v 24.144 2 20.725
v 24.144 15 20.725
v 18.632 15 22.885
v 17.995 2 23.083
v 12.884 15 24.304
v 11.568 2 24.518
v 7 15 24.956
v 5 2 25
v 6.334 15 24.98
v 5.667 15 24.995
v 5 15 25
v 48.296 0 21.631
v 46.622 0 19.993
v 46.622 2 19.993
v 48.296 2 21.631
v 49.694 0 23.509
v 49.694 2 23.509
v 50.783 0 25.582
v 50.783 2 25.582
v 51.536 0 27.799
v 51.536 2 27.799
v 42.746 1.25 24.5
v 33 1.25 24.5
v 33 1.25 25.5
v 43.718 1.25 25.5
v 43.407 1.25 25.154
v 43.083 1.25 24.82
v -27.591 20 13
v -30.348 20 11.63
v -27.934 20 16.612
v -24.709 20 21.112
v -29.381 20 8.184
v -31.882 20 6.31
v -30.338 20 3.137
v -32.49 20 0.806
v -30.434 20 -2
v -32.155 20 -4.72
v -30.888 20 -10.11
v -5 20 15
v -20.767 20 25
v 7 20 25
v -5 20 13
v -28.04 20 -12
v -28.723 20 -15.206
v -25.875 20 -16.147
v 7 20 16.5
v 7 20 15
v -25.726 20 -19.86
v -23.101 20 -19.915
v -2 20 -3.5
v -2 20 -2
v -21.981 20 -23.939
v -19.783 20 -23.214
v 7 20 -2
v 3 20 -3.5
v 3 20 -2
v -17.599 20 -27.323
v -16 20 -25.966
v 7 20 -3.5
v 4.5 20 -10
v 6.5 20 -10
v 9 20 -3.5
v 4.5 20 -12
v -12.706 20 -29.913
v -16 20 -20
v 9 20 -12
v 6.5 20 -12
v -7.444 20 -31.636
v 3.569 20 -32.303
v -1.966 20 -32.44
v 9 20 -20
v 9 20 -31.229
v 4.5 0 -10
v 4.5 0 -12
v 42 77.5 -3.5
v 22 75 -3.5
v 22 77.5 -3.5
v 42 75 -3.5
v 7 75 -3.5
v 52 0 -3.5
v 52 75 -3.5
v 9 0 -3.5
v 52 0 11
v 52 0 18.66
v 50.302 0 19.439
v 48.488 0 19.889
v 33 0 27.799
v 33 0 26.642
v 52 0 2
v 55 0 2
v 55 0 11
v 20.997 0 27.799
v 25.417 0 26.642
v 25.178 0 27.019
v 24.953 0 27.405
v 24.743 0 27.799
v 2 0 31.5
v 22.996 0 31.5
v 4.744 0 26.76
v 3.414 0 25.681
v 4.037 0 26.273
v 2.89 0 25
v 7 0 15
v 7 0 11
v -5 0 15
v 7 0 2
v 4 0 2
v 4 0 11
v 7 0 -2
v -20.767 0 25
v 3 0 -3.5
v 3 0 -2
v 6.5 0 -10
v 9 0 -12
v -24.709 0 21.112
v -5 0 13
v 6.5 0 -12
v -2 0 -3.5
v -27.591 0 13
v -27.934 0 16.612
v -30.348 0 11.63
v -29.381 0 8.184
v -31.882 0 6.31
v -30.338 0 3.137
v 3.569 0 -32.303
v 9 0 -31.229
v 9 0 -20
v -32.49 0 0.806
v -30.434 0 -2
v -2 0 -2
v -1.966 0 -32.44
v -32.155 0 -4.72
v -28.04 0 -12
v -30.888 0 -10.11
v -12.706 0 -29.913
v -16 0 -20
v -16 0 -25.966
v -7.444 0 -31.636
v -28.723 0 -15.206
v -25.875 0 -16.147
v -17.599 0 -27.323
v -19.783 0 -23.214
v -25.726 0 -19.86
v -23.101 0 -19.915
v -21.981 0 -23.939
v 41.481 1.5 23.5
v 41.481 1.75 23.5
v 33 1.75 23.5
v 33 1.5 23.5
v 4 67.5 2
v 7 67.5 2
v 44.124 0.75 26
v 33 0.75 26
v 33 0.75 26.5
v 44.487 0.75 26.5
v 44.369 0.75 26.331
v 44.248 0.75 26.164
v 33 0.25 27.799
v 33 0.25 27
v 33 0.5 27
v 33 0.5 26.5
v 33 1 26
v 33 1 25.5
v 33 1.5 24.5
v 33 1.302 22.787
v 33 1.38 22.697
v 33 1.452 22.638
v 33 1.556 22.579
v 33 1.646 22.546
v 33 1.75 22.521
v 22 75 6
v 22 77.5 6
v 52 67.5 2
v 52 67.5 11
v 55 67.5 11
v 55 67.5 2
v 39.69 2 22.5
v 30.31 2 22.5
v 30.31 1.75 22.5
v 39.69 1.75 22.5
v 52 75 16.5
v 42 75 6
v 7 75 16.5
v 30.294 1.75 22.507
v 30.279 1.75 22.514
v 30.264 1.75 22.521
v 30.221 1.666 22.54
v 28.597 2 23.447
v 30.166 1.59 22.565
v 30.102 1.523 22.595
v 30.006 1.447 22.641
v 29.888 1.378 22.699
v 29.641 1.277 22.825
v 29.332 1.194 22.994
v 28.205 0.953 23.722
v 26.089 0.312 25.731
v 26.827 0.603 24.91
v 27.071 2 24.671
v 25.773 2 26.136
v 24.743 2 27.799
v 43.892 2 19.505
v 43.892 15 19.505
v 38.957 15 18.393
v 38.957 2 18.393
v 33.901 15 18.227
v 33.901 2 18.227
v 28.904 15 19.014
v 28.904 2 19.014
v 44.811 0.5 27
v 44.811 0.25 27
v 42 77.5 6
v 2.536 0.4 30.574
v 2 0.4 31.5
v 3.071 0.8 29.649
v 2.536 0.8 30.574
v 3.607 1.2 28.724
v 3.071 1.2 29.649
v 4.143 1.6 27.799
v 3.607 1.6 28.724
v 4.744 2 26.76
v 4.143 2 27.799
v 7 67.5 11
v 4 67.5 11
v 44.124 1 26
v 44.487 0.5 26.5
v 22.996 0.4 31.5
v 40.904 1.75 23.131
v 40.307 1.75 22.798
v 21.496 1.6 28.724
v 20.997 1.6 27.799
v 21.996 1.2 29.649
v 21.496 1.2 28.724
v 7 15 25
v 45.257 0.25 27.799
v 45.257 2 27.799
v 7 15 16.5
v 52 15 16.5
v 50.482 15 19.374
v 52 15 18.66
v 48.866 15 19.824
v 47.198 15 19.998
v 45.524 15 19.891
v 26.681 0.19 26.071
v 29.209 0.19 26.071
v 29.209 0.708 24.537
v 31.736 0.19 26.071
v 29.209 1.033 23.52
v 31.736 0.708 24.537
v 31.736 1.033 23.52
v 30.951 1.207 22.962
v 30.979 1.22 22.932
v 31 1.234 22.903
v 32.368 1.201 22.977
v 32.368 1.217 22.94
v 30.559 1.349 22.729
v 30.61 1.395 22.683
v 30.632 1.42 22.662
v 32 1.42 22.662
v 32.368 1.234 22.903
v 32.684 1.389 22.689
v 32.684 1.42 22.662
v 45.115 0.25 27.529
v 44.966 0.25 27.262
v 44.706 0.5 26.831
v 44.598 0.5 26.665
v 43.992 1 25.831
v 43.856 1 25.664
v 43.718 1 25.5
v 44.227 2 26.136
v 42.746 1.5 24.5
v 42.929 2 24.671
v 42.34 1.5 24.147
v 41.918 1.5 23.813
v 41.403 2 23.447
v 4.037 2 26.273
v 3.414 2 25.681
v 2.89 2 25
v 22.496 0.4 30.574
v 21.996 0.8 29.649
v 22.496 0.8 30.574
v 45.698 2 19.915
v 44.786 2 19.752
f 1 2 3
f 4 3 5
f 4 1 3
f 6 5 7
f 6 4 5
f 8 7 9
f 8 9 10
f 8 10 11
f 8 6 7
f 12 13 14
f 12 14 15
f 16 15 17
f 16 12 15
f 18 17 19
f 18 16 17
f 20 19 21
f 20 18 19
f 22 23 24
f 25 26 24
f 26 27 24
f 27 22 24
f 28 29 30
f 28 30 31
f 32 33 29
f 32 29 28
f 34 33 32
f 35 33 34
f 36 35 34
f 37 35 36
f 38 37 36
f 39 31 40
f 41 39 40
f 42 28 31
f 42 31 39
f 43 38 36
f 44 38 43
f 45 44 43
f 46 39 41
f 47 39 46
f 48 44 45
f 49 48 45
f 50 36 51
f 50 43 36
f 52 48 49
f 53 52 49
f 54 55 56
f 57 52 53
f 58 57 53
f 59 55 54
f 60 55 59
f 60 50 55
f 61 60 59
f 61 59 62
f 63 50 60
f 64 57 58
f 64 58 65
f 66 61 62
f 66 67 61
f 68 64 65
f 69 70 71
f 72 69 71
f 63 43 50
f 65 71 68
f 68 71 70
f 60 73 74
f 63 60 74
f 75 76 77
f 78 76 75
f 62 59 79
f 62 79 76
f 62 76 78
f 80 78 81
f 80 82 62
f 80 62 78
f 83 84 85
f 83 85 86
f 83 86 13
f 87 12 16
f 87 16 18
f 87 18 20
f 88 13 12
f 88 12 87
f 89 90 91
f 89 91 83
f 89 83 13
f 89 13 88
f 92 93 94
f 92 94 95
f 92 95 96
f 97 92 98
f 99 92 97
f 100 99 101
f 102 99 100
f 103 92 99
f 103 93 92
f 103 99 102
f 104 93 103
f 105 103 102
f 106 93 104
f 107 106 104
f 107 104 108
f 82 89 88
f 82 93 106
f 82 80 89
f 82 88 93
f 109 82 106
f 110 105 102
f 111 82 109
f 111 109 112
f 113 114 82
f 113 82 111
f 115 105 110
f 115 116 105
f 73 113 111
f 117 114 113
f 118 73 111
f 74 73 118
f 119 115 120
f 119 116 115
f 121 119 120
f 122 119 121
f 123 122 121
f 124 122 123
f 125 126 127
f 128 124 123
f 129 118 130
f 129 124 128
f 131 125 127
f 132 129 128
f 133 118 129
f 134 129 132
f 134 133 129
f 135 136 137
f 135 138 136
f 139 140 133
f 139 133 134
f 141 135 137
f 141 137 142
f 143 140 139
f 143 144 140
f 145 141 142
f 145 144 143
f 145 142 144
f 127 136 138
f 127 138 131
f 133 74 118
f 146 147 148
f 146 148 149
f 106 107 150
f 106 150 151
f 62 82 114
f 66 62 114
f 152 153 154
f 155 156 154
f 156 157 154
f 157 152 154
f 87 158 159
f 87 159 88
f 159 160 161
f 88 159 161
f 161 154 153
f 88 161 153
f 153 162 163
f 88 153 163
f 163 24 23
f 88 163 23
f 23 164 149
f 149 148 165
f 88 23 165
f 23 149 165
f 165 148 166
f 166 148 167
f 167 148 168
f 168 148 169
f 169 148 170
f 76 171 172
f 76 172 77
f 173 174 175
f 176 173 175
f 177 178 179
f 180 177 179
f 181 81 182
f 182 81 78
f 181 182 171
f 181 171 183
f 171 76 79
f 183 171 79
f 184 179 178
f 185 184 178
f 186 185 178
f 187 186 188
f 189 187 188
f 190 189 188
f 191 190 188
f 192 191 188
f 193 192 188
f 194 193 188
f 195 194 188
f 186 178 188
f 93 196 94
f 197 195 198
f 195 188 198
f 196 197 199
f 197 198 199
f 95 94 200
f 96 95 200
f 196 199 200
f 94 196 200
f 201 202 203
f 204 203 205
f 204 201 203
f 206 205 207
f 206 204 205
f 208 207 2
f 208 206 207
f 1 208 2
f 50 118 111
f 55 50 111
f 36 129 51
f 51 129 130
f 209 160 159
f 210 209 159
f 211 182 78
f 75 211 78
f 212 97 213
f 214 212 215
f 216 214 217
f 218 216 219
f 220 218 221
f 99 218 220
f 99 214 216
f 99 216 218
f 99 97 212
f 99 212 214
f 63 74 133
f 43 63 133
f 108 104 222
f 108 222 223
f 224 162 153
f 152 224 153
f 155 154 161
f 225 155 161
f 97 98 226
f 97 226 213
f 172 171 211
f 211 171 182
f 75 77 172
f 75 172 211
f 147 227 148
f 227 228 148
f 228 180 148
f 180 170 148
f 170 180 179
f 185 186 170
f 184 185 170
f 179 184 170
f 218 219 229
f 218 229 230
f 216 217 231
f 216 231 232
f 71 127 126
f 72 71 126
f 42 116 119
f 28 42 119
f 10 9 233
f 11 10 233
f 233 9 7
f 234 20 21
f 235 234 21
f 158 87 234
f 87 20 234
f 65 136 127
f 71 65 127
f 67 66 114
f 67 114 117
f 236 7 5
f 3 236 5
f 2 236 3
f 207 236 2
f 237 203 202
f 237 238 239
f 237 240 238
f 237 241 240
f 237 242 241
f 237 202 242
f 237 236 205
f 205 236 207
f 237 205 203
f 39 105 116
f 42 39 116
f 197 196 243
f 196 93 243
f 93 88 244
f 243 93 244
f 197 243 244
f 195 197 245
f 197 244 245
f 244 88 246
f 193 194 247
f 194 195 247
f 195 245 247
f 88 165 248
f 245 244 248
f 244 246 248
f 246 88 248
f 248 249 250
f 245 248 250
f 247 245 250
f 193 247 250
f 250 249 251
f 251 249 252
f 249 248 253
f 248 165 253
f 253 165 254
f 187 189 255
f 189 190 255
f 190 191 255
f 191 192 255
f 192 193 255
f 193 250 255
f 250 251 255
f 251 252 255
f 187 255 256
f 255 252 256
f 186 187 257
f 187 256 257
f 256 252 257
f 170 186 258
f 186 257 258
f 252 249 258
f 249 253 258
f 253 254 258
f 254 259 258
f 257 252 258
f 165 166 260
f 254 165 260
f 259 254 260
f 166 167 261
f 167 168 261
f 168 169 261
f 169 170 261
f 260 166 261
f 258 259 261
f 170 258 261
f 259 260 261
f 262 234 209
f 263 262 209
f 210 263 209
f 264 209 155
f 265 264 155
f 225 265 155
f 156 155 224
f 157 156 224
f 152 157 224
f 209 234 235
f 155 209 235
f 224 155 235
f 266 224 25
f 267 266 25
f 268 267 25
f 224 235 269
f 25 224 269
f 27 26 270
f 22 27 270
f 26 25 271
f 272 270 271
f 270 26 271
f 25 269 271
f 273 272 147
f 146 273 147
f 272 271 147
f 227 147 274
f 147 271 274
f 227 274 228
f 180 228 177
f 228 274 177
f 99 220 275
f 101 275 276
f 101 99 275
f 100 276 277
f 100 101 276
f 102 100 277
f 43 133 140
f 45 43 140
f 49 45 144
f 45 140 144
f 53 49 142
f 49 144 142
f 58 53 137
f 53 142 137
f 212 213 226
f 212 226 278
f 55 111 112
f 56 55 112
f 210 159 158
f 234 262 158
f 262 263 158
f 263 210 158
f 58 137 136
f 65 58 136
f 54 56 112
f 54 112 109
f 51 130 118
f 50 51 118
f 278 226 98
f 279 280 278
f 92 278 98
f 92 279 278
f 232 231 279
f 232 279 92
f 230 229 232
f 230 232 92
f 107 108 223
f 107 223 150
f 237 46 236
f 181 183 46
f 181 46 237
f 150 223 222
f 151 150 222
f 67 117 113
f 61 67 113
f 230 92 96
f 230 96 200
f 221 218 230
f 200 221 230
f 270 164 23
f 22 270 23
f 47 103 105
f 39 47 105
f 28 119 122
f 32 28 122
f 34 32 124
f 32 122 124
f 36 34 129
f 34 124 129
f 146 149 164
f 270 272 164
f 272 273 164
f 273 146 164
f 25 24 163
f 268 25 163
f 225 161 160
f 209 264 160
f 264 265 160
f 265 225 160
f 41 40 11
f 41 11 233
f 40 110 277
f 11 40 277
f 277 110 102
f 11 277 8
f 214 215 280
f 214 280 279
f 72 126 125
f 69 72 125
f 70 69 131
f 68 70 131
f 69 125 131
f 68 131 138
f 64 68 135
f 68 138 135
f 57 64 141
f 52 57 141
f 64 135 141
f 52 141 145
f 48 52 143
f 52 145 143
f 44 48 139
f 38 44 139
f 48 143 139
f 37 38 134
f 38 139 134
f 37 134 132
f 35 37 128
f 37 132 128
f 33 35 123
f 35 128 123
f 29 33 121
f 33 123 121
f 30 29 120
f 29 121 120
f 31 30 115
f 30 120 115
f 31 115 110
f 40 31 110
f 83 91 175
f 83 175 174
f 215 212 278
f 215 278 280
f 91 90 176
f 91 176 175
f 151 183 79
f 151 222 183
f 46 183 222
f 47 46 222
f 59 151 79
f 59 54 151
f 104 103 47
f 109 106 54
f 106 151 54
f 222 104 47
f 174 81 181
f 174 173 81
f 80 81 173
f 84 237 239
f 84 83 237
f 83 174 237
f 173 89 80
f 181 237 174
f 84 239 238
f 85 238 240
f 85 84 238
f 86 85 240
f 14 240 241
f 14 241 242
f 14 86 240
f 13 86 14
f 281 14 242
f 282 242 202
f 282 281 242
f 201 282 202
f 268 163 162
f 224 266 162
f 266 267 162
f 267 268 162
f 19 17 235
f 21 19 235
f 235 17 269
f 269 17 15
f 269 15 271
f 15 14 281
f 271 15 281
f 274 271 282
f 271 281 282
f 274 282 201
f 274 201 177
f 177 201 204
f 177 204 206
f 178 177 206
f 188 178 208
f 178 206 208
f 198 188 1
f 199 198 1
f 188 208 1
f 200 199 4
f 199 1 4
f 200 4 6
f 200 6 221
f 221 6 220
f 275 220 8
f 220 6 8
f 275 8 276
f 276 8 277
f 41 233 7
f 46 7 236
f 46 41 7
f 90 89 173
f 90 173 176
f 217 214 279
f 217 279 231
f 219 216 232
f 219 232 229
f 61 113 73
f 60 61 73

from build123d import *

# Parameters (mm, degrees)
EXTRUDE_1_DEPTH          = 20
EXTRUDE_2_DEPTH          = 75
CUT_EXTRUDE_1_REACH      = 104.675
SKETCH_4_W               = 3
SKETCH_4_H               = 7.5
CUT_EXTRUDE_3_DEPTH      = 15
SKETCH_10_W              = 45
SKETCH_10_H              = 8.5
CUT_EXTRUDE_4_DEPTH      = 5
EXTRUDE_7_DEPTH          = 2
CUT_EXTRUDE_5_REACH      = 99.006
CUT_EXTRUDE_6_DEPTH      = 21
CUT_EXTRUDE_7_REACH      = 99.006
SKETCH_16_R              = 11.5
EXTRUDE_8_DEPTH          = 11
EXTRUDE_8_DEPTH_BACK     = 11
CUT_EXTRUDE_8_REACH      = 106.745
CUT_EXTRUDE_8_END_RADIUS = 11.5
SKETCH_22_W              = 20
SKETCH_22_H              = 9.5
EXTRUDE_9_DEPTH          = 2.5


with BuildPart() as part:
    # 草图1 → 凸台-拉伸1 (new body)
    with BuildSketch(Plane(origin=(0, 0, 0), x_dir=(1, 0, 0), z_dir=(0, 1, 0))):
        with BuildLine():
            Line((-20.766559657, -25), (52, -25))
            Line((52, -25), (52, -15))
            Line((52, -15), (-5, -15))
            Line((-5, -15), (-5, -13))
            Line((-5, -13), (-27.590759323, -13))
            ThreePointArc((-27.590759323, -13), (-29.966289228, -5.680801874), (-30.434355587, 2))
            Line((-30.434355587, 2), (-2, 2))
            Line((-2, 2), (-2, 3.5))
            Line((-2, 3.5), (3, 3.5))
            Line((3, 3.5), (3, 2))
            Line((3, 2), (9, 2))
            Line((9, 2), (9, 12))
            Line((9, 12), (6.5, 12))
            Line((6.5, 12), (6.5, 10))
            Line((6.5, 10), (4.5, 10))
            Line((4.5, 10), (4.5, 12))
            Line((4.5, 12), (-28.040149786, 12))
            ThreePointArc((-28.040149786, 12), (-23.100827955, 19.914862485), (-16, 25.966324345))
            Line((-16, 25.966324345), (-16, 20))
            Line((-16, 20), (9, 20))
            Line((9, 20), (9, 31.228992939))
            ThreePointArc((9, 31.228992939), (-28.723472863, 15.205660351), (-20.766559657, -25))
        make_face()
    extrude(amount=EXTRUDE_1_DEPTH)

    # 草图3 → 凸台-拉伸2 (add)
    with BuildSketch(Plane(origin=(0, 0, 0), x_dir=(1, 0, 0), z_dir=(0, 1, 0))):
        Polygon((7, 3.5), (52, 3.5), (52, -2), (55, -2), (55, -11), (52, -11), (52, -16.5), (7, -16.5), (7, -11), (4, -11), (4, -2), (7, -2), align=None)
    extrude(amount=EXTRUDE_2_DEPTH)

    # 草图4 → 切除-拉伸1 (cut, up to next)
    with BuildSketch(Plane.XY.offset(11), mode=Mode.PRIVATE) as cut_extrude_1_sk1:
        with Locations((5.5, 71.25)):
            Rectangle(SKETCH_4_W, SKETCH_4_H)
    cut_extrude_1_tool1 = extrude(cut_extrude_1_sk1.sketch, amount=-CUT_EXTRUDE_1_REACH, mode=Mode.PRIVATE) & part.part
    # 草图4 → 切除-拉伸1 (cut, up to next)
    with BuildSketch(Plane.XY.offset(11), mode=Mode.PRIVATE) as cut_extrude_1_sk2:
        with Locations((53.5, 71.25)):
            Rectangle(SKETCH_4_W, SKETCH_4_H)
    cut_extrude_1_tool2 = extrude(cut_extrude_1_sk2.sketch, amount=-CUT_EXTRUDE_1_REACH, mode=Mode.PRIVATE) & part.part
    add(cut_extrude_1_tool1.solids().sort_by_distance((5.5, 71.25, 11))[0], mode=Mode.SUBTRACT)
    add(cut_extrude_1_tool2.solids().sort_by_distance((53.5, 71.25, 11))[0], mode=Mode.SUBTRACT)

    # 草图9 → 切除-拉伸3 (cut)
    with BuildSketch(Plane(origin=(0, 0, 0), x_dir=(1, 0, 0), z_dir=(0, 1, 0))):
        with BuildLine():
            Line((52, -25), (52, -18.660254038))
            ThreePointArc((52, -18.660254038), (48.035984141, -19.946192078), (43.892048311, -19.504769134))
            ThreePointArc((43.892048311, -19.504769134), (33.901437956, -18.227421286), (24.144020863, -20.724764765))
            ThreePointArc((24.144020863, -20.724764765), (14.807792452, -23.918187659), (5, -25))
            Line((5, -25), (52, -25))
        make_face()
    extrude(amount=CUT_EXTRUDE_3_DEPTH, mode=Mode.SUBTRACT)

    # 草图10 → 切除-拉伸4 (cut)
    with BuildSketch(Plane(origin=(0, 20, 0), x_dir=(1, 0, 0), z_dir=(0, 1, 0))):
        with Locations((29.5, -20.75)):
            Rectangle(SKETCH_10_W, SKETCH_10_H)
    extrude(amount=-CUT_EXTRUDE_4_DEPTH, mode=Mode.SUBTRACT)

    # 草图11 → 凸台-拉伸7 (add)
    with BuildSketch(Plane(origin=(0, 0, 0), x_dir=(1, 0, 0), z_dir=(0, 1, 0))):
        with BuildLine():
            Line((2, -31.5), (4.744300512, -26.75984457))
            ThreePointArc((4.744300512, -26.75984457), (2.188260872, -20.573315931), (7.5, -16.5))
            Line((7.5, -16.5), (37, -16.5))
            ThreePointArc((37, -16.5), (47.606601718, -20.893398282), (52, -31.5))
            Line((52, -31.5), (2, -31.5))
        make_face()
    extrude(amount=EXTRUDE_7_DEPTH)

    # 草图13 → 切除-拉伸5 (cut, up to next)
    with BuildSketch(Plane(origin=(0, 2, 0), x_dir=(1, 0, 0), z_dir=(0, 1, 0)), mode=Mode.PRIVATE) as cut_extrude_5_sk1:
        Polygon((22.995595677, -31.5), (20.996905673, -27.799311895), (54.018038791, -27.799311895), (54.018038791, -31.5), align=None)
    cut_extrude_5_tool1 = extrude(cut_extrude_5_sk1.sketch, amount=-CUT_EXTRUDE_5_REACH, mode=Mode.PRIVATE) & part.part
    add(cut_extrude_5_tool1.solids().sort_by_distance((38.001947, 2, 29.630407))[0], mode=Mode.SUBTRACT)

    # 草图15 → 切除-拉伸6 (cut)
    with BuildSketch(Plane(origin=(2, 0, 0), x_dir=(0, 0, -1), z_dir=(1, 0, 0))):
        Polygon((-31.5, 0.4), (-30.574311895, 0.4), (-30.574311895, 0.8), (-29.649311895, 0.8), (-29.649311895, 1.2), (-28.724311895, 1.2), (-28.724311895, 1.6), (-27.799311895, 1.6), (-27.799311895, 2), (-31.5, 2), align=None)
    extrude(amount=CUT_EXTRUDE_6_DEPTH, mode=Mode.SUBTRACT)

    # 草图16 → 切除-拉伸7 (cut, up to next)
    with BuildSketch(Plane(origin=(0, 2, 0), x_dir=(1, 0, 0), z_dir=(0, 1, 0)), mode=Mode.PRIVATE) as cut_extrude_7_sk1:
        with Locations((35, -33)):
            Circle(SKETCH_16_R)
    cut_extrude_7_tool1 = extrude(cut_extrude_7_sk1.sketch, amount=-CUT_EXTRUDE_7_REACH, mode=Mode.PRIVATE) & part.part
    add(cut_extrude_7_tool1.solids().sort_by_distance((35, 2, 33))[0], mode=Mode.SUBTRACT)

    # 草图18 → 凸台-拉伸8 (add, two sides: drawn at the far end of the back side and taken through both)
    with BuildSketch(Plane(origin=(35, 0, 0), x_dir=(0, 0, -1), z_dir=(1, 0, 0)).offset(-EXTRUDE_8_DEPTH_BACK)):
        Polygon((-27.799311895, 0.25), (-27.799311895, 0), (-21.5, 0), (-21.5, 2), (-22.5, 2), (-22.5, 1.75), (-23.5, 1.75), (-23.5, 1.5), (-24.5, 1.5), (-24.5, 1.25), (-25.5, 1.25), (-25.5, 1), (-26, 1), (-26, 0.75), (-26.5, 0.75), (-26.5, 0.5), (-27, 0.5), (-27, 0.25), align=None)
    extrude(amount=EXTRUDE_8_DEPTH + EXTRUDE_8_DEPTH_BACK)

    # 切除-拉伸8: up to this cylinder (the profile starts inside it)
    cut_extrude_8_end = Plane(origin=(35, 1.199158, 33), z_dir=(0, 1, 0)) * Cylinder(CUT_EXTRUDE_8_END_RADIUS, 237.49, mode=Mode.PRIVATE)
    # 草图21 → 切除-拉伸8 (cut, up to the surface)
    with BuildSketch(Plane(origin=(33, 0, 0), x_dir=(0, 0, -1), z_dir=(1, 0, 0)), mode=Mode.PRIVATE) as cut_extrude_8_sk1:
        with BuildLine():
            Line((-22.5, 2), (-27.799311895, 2.043691233))
            Line((-27.799311895, 2.043691233), (-27.799311895, 0))
            add(Edge.make_bspline(
                [(-27.799311895, 0), (-27.204791672, -0.222081078), (-26.384663507, 0.078646126), (-25.326854987, 0.456459594), (-24.66401125, 0.700176127), (-24.021132133, 0.799941058), (-23.26371078, 1.202357465), (-22.499729223, 1.183276831), (-22.5, 2)],
                knots=[0, 0, 0, 0, 0.297814847, 0.424941071, 0.570246023, 0.652881605, 0.750360442, 1, 1, 1, 1], degree=3))
        make_face()
    cut_extrude_8_tool1 = extrude(cut_extrude_8_sk1.sketch, amount=-CUT_EXTRUDE_8_REACH, mode=Mode.PRIVATE) & cut_extrude_8_end
    add(cut_extrude_8_tool1.solids().sort_by_distance((33, 1.199158, 25.64967))[0], mode=Mode.SUBTRACT)

    # 草图22 → 凸台-拉伸9 (add)
    with BuildSketch(Plane(origin=(0, 75, 0), x_dir=(1, 0, 0), z_dir=(0, 1, 0))):
        with Locations((32, -1.25)):
            Rectangle(SKETCH_22_W, SKETCH_22_H)
    extrude(amount=EXTRUDE_9_DEPTH)


solid = part.part
